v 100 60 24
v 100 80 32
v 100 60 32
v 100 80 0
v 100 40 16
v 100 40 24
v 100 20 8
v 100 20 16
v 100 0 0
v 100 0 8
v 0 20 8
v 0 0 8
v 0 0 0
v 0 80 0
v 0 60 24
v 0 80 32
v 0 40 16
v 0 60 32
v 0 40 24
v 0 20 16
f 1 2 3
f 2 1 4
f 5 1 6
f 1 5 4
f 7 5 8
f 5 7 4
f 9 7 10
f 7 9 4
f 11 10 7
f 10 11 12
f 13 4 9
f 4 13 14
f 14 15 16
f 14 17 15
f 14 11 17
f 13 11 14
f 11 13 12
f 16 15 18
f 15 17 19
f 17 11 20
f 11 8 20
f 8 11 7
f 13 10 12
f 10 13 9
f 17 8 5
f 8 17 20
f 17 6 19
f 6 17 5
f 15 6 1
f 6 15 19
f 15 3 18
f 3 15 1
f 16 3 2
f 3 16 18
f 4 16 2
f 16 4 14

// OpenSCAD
/*MAIN PARAMETERS*/
number_steps = 4;
step_z = 8; //height of each step (+fencing)
step_x = 100; //length of each step (+fencing)
step_y = 20; //depth of each step (+fencing)
    
/*FENCING RELATED PARAMS*/
add_front_fencing = 0; //[0:false,1:true]
add_left_fencing = 0; //[0:false,1:true]
add_right_fencing = 0; //[0:false,1:true] 
rounded_fencing = 1; //[0:false,1:true]
fence_thickness = 2;
fence_height = 2;

fence_radius = fence_thickness/2;

/*GUTTER RELATED PARAMS*/
add_gutter = 0 ; //[0:false,1:true]
gutter_radius = 2;
add_y_gutter = 0; //[0:false,1:true]
number_y_gutter = 5; 
gutter_gap =3;


if(add_gutter){ 
    difference() {
        stairs();
        
        for ( i = [0: number_steps]){ 
            
            translated_y = (i ) * step_y; 
            translate([gutter_gap, translated_y, 0]){ 
                spacerX();
            }
        }  
        if(add_y_gutter){ 
            spacing = step_x / number_y_gutter;
            height = number_steps * step_y;
        
            for ( i = [0: number_y_gutter]){ 
                
            translated_x = (i ) * spacing; 
                translate([translated_x, gutter_gap, 0]){ 
                     
                        spacerY(height);
                     
                }
            }
        }
    }
}else{
    stairs(); 
}
 
 
module stairs(){ 
    for ( i = [1: number_steps]){ 
     stairs_y = (i-1) * step_y;
     height = i * step_z;  
        translate([0, stairs_y, 0]){ 
            cube([step_x, step_y, height]); 
            
            total_height = fence_height+height ;
            
            if(add_front_fencing){
                front_fence(total_height);
            }
            if(add_left_fencing){
                side_fence(total_height);
            }
            if(add_right_fencing){
                translate([step_x-fence_thickness,0,0])
                side_fence(total_height);
            }
        }    
    }
}

/*FENCING RELATED*/
module front_fence(total_height){
    if(rounded_fencing){
         
        length_offset = 
        (add_left_fencing && add_right_fencing) ? fence_thickness 
        : (add_left_fencing || add_right_fencing) ? fence_radius
        : 0; 
        
        height_offset =total_height-fence_radius;
        left_offset = (add_left_fencing)? fence_radius :0;
        
        
        translate([left_offset,0,0]){
        //top round portion
        translate([0,fence_radius, height_offset])
        rotate([0,90,0])
        cylinder(d=fence_thickness,h= step_x-length_offset);
        //bottom fence 
        cube([step_x-length_offset,  fence_thickness, height_offset]); 
        }
        
        
    } else{
        cube([step_x,  fence_thickness, total_height]);
    }
}

module side_fence(total_height){
    if(rounded_fencing){ 
        height_offset =total_height-fence_radius;
        translate([fence_radius ,fence_radius, height_offset]){
            //top round portion
            rotate([-90,0,0])
            cylinder(d=fence_thickness,h= step_y-fence_radius);
            //corner sphere
            sphere(d=fence_thickness);
            
        }
        //bottom fence
        translate([0,fence_radius,0])
        cube([fence_thickness, step_y-fence_radius, height_offset]);
        //corner post
        translate([fence_radius,fence_radius,0])
        cylinder(d=fence_thickness, h=height_offset);
        
    }else {
       cube([fence_thickness, step_y, total_height]);
    }
    
}

/*GUTTER RELATED*/
module spacerX(){  
    rotate([0,90,0]){
        color("purple", 1.0){
        cylinder( step_x-2*gutter_gap, gutter_radius, gutter_radius);
        }
    } 
}

module spacerY(height){  
    rotate([-90,0,0]){
        color("purple", 1.0){
        cylinder( height-2*gutter_gap, gutter_radius, gutter_radius);
        }
    } 
}
 
   
